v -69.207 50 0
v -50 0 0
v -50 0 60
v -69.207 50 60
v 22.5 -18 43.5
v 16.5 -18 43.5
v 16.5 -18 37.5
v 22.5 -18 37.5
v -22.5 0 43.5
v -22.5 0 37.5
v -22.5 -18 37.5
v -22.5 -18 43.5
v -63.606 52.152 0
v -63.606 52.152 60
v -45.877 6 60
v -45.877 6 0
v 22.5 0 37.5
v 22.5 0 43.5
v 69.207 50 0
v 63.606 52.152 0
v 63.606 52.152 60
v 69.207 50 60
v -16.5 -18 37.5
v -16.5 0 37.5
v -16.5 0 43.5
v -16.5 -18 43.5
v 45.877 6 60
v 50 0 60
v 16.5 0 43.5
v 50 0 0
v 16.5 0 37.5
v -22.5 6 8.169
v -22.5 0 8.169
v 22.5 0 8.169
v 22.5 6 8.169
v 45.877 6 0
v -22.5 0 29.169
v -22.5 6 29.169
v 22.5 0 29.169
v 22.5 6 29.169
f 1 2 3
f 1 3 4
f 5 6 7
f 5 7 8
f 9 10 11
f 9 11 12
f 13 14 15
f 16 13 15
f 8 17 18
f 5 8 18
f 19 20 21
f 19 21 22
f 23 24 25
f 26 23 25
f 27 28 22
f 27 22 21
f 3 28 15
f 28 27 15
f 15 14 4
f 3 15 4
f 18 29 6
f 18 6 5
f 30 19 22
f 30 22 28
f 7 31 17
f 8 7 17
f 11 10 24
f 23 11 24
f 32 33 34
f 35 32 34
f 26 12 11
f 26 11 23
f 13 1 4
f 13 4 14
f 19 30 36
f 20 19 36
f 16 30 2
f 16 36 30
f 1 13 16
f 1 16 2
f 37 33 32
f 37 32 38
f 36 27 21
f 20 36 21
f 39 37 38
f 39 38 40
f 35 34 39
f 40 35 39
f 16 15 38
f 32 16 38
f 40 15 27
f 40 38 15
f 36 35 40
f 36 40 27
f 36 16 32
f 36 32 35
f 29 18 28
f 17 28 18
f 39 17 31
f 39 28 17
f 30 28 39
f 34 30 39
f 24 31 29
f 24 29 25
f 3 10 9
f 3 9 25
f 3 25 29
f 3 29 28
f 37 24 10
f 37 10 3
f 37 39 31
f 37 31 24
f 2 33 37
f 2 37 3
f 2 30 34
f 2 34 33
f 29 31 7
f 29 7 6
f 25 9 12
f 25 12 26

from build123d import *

# Parameters (mm, degrees)
BOSS_EXTRUDE1_DEPTH = 60
SKETCH2_W           = 45
SKETCH2_H           = 21
CUT_EXTRUDE1_DEPTH  = 6
SKETCH3_W           = 6
SKETCH3_H           = 6
BOSS_EXTRUDE2_DEPTH = 18


with BuildPart() as part:
    # Sketch1 → Boss-Extrude1 (new body)
    with BuildSketch(Plane.XY):
        Polygon((50, 0), (-50, 0), (-69.206794991, 50), (-63.605822035, 52.151534787), (-45.877360691, 6), (45.877360691, 6), (63.605822035, 52.151534787), (69.206794991, 50), align=None)
    extrude(amount=BOSS_EXTRUDE1_DEPTH)

    # Sketch2 → Cut-Extrude1 (cut)
    with BuildSketch(Plane.XZ):
        with Locations((0, 18.669109879)):
            Rectangle(SKETCH2_W, SKETCH2_H)
    extrude(amount=-CUT_EXTRUDE1_DEPTH, mode=Mode.SUBTRACT)

    # Sketch3 → Boss-Extrude2 (add)
    with BuildSketch(Plane.XZ):
        with Locations((-19.5, 40.5)):
            Rectangle(SKETCH3_W, SKETCH3_H)
        with Locations((19.5, 40.5)):
            Rectangle(SKETCH3_W, SKETCH3_H)
    extrude(amount=BOSS_EXTRUDE2_DEPTH)


solid = part.part
